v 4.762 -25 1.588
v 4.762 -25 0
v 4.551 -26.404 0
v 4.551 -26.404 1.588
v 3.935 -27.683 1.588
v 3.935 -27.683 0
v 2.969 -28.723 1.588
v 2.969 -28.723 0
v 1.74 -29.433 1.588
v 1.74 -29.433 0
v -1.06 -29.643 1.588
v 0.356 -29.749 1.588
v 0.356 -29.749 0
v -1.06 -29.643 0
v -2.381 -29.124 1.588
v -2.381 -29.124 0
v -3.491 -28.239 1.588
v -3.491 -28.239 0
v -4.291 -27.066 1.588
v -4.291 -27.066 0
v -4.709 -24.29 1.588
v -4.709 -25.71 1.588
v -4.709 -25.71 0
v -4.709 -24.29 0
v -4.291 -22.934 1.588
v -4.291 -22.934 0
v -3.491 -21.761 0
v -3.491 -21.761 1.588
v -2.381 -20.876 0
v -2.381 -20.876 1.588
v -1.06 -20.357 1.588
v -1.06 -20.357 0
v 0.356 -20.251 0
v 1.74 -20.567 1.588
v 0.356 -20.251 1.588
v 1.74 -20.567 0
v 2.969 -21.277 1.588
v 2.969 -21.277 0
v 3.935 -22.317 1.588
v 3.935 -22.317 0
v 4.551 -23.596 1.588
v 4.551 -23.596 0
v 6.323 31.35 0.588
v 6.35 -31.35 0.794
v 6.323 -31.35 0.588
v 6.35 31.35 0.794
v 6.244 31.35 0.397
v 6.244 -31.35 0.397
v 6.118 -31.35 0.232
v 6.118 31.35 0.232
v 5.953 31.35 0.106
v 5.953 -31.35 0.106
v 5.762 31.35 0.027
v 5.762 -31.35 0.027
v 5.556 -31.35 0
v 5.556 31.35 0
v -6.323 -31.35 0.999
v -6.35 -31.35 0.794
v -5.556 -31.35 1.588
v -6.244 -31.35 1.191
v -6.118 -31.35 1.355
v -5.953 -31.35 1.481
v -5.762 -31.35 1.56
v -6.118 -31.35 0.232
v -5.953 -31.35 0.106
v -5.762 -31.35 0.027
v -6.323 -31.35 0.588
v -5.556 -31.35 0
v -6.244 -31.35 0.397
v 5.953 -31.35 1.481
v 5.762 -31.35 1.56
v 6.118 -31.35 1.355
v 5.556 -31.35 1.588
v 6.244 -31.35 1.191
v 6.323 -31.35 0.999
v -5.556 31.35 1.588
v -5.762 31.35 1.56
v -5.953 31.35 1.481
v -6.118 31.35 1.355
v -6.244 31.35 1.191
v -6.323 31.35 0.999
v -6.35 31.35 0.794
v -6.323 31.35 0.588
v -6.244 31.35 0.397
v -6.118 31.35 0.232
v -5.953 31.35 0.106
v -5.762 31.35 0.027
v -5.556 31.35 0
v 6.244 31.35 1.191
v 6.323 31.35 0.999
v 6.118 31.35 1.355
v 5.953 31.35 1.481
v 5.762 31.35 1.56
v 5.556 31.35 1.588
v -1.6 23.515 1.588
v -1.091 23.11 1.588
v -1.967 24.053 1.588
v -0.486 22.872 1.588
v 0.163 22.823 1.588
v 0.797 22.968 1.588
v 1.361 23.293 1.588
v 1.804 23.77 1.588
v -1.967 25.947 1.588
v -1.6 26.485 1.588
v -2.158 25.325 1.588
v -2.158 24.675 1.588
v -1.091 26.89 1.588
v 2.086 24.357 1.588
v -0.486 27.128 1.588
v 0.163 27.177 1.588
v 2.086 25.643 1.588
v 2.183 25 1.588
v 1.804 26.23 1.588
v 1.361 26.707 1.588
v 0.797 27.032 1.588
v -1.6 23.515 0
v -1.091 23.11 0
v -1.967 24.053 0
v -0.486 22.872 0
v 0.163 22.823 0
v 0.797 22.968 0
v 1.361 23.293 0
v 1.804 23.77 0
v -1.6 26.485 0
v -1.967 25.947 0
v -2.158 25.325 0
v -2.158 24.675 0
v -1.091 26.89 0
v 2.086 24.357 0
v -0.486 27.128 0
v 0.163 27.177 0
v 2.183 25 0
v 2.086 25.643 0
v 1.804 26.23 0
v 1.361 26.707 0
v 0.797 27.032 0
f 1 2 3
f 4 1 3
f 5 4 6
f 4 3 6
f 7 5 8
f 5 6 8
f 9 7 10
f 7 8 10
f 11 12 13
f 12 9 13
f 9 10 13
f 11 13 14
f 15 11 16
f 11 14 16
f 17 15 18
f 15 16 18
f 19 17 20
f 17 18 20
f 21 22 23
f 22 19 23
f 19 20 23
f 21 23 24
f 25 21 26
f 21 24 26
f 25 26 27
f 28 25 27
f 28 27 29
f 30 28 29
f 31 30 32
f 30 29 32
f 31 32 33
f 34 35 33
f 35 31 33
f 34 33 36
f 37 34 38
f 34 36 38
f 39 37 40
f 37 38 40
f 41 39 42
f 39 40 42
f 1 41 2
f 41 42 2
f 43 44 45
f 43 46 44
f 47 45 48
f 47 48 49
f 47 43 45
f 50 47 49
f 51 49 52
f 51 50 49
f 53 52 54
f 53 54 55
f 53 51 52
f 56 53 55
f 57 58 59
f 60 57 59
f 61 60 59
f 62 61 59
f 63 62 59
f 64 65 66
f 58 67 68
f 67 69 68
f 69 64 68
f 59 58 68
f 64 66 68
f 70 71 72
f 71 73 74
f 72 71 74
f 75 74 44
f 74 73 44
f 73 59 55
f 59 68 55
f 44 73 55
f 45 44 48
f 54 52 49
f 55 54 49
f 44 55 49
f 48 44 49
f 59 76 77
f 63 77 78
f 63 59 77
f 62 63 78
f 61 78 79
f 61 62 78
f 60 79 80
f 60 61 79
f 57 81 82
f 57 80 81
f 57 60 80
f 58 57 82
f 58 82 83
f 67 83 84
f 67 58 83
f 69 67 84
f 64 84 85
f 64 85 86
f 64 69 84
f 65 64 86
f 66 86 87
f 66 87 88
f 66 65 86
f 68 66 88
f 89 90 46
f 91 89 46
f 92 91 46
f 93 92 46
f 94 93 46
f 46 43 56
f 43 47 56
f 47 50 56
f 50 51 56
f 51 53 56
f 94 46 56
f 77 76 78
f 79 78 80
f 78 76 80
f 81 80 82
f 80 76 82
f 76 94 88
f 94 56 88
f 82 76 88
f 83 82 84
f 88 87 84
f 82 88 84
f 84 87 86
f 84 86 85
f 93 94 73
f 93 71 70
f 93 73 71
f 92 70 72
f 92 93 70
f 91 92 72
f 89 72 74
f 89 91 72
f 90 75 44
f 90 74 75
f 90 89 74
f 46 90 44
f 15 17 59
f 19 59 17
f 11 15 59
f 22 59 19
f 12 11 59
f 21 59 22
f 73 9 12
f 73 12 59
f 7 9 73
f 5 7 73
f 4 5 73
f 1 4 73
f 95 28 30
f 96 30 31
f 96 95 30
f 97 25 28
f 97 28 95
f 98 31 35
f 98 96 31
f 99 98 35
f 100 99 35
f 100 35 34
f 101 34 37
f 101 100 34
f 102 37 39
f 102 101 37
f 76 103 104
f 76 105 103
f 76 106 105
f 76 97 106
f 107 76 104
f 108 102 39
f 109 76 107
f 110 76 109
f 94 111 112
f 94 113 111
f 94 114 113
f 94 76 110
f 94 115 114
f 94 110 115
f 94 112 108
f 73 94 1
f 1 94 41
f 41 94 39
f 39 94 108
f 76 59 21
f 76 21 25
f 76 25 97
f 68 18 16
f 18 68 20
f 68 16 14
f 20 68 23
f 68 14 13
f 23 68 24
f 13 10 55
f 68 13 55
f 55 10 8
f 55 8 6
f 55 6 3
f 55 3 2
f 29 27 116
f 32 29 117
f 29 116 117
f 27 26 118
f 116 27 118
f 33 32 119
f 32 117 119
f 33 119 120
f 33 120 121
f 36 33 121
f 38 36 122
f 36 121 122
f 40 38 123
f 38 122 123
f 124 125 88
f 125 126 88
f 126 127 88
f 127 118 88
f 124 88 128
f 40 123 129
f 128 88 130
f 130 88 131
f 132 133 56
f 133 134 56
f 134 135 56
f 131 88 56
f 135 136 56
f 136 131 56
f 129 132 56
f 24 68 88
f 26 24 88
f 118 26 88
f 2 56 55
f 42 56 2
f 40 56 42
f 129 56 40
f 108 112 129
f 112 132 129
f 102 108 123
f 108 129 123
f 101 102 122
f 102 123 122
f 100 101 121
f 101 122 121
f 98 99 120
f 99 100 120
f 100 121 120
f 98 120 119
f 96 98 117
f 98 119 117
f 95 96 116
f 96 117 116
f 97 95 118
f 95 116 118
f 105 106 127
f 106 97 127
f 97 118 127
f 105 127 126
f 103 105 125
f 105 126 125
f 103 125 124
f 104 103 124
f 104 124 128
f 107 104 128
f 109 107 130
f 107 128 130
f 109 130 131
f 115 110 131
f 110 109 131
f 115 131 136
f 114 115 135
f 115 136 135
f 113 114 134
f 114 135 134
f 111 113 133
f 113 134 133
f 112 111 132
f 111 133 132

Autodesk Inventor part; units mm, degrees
ref_plane "YZ Plane" through (0, 0, 0) normal (1, 0, 0) x (0, 1, 0)
ref_plane "XZ Plane" through (0, 0, 0) normal (0, 1, 0) x (-1, 0, 0)
ref_plane "XY Plane" through (0, 0, 0) normal (0, 0, 1) x (1, 0, 0)
sketch "Sketch1" plane through (0, 0, 0) normal (0, 0, 1) x (1, 0, 0)
  circle A0 centre (0, 25) radius 2.1828
  circle A1 centre (0, -25) radius 4.7625
  line L0 (-6.35, -31.35) -> (6.35, -31.35)
  line L1 (6.35, -31.35) -> (6.35, 31.35)
  line L2 (6.35, 31.35) -> (-6.35, 31.35)
  line L3 (-6.35, 31.35) -> (-6.35, -31.35)
  line L4 (-6.35, -31.35) -> (6.35, 31.35) construction
  line L5 (6.35, -31.35) -> (-6.35, 31.35) construction
  point P0 (0, 0)
  dimension "d0" = 4.3656
  dimension "d1" = 9.525
  dimension "d2" = 25
  dimension "d3" = 50
  dimension "d4" = 12.7
  dimension "d5" = 6.35
extrude "Extrusion1" add sketch "Sketch1" along normal blind 1.5875
fillet "Fillet1" radius 0.7937 4 edges at (-6.35, 0, 0) (-6.35, 0, 1.5875) (6.35, 0, 0) (6.35, 0, 1.5875)
properties part number "Part J"
